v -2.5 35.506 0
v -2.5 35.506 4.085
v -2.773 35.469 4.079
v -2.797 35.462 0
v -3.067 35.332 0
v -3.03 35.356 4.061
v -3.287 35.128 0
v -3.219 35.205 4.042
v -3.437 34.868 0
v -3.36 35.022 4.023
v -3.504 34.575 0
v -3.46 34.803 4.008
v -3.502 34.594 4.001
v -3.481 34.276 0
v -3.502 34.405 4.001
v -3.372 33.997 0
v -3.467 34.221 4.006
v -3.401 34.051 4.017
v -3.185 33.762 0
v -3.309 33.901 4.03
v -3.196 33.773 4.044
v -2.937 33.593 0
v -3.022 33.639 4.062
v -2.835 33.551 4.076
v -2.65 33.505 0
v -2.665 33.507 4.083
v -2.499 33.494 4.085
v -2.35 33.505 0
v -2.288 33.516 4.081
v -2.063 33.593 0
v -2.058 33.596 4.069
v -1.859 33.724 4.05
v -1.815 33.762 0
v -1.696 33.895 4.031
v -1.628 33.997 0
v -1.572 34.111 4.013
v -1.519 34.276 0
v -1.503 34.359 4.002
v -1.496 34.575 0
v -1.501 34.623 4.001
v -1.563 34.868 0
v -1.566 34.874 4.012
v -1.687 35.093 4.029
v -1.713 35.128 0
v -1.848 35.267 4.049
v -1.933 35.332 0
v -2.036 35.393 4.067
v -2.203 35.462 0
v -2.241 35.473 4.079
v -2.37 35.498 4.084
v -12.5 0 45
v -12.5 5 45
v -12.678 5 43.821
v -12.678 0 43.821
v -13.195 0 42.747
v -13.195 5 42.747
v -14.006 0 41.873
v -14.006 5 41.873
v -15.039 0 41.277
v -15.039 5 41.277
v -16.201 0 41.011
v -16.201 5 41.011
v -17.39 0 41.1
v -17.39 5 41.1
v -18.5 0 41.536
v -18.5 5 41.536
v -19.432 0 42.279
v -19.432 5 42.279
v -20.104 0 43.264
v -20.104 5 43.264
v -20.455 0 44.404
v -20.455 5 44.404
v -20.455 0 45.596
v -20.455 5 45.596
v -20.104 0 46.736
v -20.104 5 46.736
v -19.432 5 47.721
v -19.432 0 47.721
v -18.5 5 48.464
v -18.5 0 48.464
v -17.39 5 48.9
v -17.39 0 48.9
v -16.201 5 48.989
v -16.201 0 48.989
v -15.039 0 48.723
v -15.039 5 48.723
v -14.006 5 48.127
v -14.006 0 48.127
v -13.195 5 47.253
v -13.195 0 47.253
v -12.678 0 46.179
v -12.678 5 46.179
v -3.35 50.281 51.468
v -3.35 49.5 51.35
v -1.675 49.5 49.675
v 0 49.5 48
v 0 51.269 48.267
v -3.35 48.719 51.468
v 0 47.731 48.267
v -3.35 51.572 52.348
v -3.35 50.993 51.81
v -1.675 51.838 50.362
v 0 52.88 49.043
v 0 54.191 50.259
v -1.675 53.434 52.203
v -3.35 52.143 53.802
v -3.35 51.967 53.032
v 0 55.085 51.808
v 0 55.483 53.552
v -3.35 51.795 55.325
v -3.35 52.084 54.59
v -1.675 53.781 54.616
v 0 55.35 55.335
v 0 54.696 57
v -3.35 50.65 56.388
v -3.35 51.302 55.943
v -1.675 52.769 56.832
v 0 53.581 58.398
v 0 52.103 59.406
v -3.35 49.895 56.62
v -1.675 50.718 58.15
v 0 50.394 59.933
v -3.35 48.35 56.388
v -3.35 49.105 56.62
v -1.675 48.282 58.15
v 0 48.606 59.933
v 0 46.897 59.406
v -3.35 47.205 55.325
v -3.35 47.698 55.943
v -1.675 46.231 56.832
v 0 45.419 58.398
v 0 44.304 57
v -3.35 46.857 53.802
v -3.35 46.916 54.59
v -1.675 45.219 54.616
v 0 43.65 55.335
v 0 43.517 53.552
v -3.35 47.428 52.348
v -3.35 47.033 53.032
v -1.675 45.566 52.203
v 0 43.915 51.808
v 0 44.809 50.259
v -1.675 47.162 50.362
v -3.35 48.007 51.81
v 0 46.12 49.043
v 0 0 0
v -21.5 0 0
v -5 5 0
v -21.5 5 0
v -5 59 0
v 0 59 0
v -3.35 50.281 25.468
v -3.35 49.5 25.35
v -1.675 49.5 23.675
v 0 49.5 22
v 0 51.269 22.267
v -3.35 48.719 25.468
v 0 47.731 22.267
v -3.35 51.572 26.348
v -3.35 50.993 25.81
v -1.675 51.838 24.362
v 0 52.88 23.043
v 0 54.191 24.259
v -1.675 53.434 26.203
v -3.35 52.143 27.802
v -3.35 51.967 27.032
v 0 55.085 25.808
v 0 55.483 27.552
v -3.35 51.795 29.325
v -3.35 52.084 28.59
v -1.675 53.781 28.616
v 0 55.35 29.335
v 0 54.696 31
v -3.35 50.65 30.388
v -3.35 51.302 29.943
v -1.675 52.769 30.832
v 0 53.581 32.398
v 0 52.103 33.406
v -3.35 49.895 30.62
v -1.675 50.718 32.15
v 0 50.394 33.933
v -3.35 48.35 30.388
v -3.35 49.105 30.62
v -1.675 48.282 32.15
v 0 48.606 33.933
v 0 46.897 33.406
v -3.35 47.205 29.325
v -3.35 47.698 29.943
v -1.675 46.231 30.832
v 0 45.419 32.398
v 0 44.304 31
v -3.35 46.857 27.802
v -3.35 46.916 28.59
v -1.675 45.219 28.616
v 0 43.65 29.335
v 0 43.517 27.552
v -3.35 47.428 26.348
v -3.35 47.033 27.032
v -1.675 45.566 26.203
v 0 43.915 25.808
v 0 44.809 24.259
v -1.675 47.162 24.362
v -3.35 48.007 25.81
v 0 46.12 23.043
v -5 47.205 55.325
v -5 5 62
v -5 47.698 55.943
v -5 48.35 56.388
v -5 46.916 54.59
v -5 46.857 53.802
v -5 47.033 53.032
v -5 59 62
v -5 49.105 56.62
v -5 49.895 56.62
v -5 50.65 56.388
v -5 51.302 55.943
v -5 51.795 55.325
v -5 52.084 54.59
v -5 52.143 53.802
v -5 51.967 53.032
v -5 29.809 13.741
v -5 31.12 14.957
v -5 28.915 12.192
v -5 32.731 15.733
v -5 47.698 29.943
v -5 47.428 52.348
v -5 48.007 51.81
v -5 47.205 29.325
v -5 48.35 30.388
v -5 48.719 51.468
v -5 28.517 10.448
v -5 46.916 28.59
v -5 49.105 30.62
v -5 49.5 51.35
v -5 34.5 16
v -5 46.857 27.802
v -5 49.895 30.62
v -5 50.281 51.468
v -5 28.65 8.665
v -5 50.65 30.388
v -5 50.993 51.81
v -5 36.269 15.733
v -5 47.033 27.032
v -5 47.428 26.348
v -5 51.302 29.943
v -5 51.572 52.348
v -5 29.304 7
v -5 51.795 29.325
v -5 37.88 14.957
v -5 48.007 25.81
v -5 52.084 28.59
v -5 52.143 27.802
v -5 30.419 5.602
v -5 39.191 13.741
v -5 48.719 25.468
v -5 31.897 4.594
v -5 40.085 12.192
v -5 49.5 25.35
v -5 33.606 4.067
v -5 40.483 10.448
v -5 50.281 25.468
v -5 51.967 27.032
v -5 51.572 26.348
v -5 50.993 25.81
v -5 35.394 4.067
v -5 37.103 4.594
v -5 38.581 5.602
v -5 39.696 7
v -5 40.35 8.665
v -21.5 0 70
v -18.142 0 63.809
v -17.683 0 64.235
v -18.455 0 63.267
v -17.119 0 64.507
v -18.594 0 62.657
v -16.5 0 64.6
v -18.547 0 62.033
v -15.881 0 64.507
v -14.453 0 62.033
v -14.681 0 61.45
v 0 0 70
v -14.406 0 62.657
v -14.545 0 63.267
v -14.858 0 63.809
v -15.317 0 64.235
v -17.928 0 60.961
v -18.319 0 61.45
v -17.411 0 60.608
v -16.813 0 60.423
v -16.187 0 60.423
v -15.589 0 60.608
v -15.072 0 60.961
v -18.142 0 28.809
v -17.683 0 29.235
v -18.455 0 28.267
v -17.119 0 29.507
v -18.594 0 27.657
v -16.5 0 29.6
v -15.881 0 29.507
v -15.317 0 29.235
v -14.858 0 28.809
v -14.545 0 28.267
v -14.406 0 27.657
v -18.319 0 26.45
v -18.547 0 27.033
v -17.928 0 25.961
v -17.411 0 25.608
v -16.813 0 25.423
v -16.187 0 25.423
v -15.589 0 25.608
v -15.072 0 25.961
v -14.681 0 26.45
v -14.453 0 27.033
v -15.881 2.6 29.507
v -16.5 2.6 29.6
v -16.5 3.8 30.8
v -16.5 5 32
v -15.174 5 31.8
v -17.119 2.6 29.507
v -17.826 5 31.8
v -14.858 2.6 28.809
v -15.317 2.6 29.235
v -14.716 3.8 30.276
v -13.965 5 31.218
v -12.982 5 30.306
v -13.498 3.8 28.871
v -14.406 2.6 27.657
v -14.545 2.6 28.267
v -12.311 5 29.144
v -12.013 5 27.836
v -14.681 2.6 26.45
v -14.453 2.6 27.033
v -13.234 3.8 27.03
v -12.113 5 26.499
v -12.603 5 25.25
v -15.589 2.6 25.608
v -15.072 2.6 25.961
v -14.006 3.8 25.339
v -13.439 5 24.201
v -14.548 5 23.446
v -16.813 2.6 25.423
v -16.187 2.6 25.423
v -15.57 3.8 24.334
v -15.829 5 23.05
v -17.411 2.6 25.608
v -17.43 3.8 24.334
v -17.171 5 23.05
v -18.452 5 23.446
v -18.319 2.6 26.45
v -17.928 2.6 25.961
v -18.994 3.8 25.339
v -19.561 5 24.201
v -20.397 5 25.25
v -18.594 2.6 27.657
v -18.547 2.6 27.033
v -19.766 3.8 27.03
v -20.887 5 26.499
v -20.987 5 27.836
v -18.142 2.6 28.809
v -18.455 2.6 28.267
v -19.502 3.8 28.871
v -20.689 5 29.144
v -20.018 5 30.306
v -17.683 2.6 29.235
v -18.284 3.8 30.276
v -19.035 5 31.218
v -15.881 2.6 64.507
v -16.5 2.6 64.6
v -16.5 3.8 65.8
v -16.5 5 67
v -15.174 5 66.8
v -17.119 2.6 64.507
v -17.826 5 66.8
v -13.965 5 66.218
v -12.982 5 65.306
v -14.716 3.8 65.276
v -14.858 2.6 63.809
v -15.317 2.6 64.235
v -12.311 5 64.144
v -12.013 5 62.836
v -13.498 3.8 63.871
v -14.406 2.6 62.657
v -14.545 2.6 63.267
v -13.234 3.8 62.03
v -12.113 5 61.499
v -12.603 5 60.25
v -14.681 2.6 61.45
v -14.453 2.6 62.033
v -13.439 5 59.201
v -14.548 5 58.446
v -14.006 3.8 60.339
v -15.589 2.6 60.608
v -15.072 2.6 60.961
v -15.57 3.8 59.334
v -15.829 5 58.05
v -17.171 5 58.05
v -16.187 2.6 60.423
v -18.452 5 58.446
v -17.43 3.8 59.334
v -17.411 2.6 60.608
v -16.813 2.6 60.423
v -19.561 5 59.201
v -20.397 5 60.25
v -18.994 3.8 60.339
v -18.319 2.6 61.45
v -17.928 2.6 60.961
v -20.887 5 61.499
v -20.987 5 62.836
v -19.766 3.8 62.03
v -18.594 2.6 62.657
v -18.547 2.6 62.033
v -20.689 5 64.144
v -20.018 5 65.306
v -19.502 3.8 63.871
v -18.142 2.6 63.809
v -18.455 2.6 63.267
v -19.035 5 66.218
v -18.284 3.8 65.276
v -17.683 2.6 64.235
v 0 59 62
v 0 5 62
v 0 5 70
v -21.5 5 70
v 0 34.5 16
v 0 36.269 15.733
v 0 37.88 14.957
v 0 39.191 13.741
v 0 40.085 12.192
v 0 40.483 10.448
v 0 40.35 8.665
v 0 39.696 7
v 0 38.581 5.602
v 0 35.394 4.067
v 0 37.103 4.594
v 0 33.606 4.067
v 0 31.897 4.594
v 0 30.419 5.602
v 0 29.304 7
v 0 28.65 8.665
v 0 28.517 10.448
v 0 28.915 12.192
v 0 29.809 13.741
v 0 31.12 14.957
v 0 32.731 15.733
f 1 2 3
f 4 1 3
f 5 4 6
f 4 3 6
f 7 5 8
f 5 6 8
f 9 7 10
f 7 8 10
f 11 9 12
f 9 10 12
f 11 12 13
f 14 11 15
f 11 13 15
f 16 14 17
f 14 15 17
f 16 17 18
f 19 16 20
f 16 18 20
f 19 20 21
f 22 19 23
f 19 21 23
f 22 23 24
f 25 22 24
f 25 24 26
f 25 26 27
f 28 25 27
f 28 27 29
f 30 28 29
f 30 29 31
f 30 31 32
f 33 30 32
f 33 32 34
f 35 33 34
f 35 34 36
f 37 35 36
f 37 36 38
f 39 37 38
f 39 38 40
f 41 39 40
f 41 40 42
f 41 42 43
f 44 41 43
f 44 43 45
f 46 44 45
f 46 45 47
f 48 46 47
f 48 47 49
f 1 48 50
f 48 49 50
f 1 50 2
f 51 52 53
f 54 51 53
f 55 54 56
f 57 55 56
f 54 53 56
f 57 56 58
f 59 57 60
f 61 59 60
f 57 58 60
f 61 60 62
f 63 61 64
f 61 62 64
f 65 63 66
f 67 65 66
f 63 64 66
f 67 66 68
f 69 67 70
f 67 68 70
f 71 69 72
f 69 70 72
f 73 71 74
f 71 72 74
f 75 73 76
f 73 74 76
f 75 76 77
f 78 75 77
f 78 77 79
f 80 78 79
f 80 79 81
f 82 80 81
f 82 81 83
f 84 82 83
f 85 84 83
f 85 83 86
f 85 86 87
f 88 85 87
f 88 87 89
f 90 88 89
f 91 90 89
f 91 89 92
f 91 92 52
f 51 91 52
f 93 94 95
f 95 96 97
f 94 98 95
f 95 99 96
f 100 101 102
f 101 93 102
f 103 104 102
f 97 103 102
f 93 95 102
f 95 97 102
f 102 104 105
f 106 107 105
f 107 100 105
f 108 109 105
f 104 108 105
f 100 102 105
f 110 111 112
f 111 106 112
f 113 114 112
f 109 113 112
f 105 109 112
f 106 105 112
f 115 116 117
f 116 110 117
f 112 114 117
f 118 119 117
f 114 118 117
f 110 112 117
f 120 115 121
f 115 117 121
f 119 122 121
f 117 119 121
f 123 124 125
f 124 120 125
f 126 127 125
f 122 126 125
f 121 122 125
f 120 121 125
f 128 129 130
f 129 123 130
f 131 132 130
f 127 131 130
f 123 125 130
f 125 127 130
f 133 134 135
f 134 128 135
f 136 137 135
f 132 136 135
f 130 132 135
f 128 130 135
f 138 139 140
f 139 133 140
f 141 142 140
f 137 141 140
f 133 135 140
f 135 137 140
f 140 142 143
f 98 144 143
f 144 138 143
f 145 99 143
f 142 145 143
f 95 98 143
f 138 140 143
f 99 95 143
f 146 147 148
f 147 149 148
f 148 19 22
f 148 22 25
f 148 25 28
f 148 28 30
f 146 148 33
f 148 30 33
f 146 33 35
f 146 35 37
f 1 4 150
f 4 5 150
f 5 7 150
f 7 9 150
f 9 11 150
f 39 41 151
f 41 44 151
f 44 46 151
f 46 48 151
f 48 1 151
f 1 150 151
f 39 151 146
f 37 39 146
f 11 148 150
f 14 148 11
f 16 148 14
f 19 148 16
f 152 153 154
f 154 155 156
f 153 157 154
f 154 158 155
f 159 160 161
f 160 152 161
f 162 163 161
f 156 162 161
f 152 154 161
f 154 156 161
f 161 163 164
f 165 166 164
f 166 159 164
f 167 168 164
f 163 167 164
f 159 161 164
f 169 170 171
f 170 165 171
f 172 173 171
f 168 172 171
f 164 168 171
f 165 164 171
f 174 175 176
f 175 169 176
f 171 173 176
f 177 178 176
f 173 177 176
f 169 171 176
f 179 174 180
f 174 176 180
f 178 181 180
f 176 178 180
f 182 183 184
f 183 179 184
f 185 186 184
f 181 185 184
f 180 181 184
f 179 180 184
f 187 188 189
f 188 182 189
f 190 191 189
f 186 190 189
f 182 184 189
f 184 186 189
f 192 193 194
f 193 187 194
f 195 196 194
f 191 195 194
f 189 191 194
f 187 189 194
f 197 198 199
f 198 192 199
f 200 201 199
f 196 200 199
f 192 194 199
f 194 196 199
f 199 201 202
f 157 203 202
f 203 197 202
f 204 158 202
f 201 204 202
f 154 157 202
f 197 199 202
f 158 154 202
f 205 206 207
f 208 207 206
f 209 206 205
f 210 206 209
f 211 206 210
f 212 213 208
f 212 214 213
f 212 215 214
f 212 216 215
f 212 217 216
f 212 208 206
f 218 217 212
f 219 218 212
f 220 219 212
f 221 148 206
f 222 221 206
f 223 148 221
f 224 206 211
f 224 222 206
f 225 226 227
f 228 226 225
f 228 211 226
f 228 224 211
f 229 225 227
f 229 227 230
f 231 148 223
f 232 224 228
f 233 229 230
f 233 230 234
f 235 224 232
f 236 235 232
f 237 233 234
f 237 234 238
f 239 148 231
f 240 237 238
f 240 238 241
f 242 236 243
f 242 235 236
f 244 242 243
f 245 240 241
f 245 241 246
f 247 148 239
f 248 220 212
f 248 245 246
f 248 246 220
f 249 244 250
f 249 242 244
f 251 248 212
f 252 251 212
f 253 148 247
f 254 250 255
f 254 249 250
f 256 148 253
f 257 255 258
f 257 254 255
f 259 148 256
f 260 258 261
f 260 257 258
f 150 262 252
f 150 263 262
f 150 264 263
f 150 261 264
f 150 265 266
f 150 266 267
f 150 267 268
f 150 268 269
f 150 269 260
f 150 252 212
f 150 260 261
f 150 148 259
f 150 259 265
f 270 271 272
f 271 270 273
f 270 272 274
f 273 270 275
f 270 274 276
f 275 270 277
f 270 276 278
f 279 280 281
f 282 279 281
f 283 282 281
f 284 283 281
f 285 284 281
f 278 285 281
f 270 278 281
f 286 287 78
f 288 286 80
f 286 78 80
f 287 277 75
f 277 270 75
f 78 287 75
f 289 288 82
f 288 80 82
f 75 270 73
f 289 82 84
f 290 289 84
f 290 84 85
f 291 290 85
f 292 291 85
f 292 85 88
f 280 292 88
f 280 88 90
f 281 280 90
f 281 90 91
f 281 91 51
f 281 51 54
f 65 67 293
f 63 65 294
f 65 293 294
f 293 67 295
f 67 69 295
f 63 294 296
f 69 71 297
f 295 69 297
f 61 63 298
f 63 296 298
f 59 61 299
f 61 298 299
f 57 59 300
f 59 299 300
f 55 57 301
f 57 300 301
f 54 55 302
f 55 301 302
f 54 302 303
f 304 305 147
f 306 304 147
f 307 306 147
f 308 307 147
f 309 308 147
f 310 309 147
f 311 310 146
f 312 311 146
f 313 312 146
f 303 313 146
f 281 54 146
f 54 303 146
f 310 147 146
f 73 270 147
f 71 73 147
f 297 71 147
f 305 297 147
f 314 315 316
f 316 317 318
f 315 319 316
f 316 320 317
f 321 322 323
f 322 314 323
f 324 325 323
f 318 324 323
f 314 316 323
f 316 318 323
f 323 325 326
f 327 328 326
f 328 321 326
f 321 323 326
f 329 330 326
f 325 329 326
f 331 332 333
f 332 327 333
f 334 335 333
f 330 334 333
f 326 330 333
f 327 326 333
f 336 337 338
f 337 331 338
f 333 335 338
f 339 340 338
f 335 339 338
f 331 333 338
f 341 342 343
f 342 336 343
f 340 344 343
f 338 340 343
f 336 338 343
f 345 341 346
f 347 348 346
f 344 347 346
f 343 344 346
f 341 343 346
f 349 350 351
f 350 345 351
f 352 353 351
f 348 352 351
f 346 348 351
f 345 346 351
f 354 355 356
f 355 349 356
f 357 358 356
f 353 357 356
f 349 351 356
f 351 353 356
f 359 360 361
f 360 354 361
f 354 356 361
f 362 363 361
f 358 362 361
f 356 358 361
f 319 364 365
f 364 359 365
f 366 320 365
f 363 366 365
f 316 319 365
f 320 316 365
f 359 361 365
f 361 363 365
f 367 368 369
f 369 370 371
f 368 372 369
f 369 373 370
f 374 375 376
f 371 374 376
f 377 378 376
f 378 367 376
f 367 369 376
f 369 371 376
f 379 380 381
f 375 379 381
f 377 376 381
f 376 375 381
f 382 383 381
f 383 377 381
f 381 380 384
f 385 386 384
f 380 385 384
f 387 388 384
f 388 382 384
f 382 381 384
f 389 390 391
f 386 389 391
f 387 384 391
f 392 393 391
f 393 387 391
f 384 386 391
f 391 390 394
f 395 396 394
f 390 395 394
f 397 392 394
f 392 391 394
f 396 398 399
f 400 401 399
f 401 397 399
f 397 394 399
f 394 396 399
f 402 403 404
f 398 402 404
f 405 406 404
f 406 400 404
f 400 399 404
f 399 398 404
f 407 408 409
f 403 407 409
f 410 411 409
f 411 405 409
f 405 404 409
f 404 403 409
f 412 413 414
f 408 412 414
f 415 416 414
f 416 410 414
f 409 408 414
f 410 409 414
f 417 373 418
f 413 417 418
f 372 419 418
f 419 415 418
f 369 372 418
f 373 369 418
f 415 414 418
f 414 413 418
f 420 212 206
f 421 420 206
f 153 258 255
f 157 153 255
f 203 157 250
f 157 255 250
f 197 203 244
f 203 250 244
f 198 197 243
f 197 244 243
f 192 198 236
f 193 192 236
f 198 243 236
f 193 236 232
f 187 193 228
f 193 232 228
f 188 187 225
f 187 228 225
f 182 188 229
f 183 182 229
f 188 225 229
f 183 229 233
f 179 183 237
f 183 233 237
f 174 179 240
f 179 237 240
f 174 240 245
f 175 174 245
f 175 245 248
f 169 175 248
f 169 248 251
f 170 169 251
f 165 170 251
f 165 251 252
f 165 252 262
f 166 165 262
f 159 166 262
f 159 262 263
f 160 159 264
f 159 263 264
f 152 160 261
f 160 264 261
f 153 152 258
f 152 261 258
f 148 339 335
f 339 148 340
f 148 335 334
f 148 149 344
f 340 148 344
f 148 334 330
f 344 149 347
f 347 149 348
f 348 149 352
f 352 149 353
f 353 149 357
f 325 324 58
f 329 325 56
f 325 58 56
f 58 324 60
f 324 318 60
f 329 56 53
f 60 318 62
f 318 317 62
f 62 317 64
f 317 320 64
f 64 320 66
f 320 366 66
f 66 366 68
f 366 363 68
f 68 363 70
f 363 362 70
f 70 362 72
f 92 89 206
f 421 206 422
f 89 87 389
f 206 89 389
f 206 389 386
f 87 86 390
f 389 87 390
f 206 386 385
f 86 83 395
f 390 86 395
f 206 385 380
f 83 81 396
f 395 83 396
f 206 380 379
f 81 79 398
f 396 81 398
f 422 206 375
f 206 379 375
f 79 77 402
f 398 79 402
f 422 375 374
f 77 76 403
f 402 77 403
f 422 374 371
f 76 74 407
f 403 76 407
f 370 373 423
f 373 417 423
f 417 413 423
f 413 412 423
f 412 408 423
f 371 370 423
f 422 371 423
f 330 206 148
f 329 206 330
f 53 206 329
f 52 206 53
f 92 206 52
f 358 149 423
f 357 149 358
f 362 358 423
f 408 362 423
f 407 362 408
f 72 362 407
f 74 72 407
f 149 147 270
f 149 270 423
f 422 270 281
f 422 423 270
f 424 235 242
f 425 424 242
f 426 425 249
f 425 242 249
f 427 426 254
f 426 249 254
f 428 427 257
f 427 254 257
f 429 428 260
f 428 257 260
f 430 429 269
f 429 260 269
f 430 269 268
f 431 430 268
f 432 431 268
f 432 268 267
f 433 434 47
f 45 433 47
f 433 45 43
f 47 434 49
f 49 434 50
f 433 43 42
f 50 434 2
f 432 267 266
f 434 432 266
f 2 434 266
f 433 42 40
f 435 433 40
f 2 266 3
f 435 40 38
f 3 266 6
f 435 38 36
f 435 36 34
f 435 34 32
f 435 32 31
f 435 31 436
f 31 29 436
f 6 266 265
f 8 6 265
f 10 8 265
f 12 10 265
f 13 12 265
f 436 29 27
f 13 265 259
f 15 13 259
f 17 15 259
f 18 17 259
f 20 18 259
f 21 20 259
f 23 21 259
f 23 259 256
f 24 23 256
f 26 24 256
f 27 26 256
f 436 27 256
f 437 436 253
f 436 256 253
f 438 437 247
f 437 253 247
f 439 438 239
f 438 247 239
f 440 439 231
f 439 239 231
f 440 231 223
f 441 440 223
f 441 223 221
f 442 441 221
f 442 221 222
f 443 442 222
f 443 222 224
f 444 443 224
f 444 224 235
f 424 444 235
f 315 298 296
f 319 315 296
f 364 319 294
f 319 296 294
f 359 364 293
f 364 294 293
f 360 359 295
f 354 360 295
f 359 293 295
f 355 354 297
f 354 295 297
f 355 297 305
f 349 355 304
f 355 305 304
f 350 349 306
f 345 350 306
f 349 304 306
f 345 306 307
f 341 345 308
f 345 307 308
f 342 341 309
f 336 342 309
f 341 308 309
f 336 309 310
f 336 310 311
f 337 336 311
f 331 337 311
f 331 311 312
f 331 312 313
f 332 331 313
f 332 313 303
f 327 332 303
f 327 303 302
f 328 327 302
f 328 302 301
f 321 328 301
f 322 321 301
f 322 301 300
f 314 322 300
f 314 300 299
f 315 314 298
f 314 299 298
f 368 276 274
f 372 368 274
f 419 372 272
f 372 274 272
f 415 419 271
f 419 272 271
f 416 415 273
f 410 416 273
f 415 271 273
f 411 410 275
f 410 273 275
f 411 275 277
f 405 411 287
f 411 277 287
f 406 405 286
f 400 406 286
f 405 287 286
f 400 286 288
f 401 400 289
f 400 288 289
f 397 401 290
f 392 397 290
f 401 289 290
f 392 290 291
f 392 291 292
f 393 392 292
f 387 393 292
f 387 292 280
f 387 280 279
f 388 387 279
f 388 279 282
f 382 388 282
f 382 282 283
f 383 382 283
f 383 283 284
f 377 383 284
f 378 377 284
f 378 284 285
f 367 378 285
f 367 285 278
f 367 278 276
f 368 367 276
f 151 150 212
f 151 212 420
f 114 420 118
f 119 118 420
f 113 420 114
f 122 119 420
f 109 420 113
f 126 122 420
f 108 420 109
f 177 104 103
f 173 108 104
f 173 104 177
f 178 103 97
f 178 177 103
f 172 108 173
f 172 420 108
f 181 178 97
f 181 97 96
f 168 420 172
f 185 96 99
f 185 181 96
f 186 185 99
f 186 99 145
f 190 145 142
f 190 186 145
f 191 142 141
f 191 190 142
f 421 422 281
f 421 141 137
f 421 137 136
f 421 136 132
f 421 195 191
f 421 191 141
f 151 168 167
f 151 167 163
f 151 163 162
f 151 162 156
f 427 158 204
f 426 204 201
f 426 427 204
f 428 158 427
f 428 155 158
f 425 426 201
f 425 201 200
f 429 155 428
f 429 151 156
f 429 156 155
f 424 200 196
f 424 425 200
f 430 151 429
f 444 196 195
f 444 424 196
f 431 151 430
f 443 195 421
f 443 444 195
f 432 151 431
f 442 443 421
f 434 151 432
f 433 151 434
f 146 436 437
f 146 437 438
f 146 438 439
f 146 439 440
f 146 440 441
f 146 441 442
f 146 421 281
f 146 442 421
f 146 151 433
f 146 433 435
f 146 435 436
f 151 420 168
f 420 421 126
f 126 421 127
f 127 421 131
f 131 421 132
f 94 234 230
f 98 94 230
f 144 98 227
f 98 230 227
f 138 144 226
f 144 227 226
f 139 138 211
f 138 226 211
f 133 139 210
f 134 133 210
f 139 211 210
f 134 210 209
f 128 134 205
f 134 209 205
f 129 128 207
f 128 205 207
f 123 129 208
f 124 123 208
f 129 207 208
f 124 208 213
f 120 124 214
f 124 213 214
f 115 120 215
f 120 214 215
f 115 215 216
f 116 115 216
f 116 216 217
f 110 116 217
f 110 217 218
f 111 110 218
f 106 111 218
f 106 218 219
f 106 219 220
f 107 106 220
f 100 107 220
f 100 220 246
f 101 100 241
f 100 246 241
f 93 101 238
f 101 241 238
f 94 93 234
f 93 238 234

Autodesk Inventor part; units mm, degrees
ref_plane "YZ Plane" through (0, 0, 0) normal (1, 0, 0) x (0, 1, 0)
ref_plane "XZ Plane" through (0, 0, 0) normal (0, 1, 0) x (-1, 0, 0)
ref_plane "XY Plane" through (0, 0, 0) normal (0, 0, 1) x (1, 0, 0)
sketch "Skizze1" plane through (0, 0, 0) normal (0, 0, 1) x (1, 0, 0)
  line L0 (0, 70.8) -> (0, -11.8) projected
  line L1 (-25.8, 0) -> (4.3, 0) projected
  line L2 (-21.5, 0) -> (-21.5, 5)
  line L3 (-21.5, 5) -> (-5, 5)
  line L4 (-5, 5) -> (-5, 59)
  line L5 (-5, 59) -> (0, 59)
  line L6 (0, 59) -> (0, 0)
  line L7 (0, 0) -> (-21.5, 0)
  dimension "d0" = 16.5
  dimension "d1" = 5
  dimension "d2" = 5
  dimension "d3" = 54
extrude "Extrusion1" add sketch "Skizze1" along normal blind 70
sketch "Skizze2" plane through (-21.5, 5, 0) normal (0, 1, 0) x (1, 0, 0)
  line L0 (0, -70) -> (16.5, -70) projected
  line L1 (0, 0) -> (0, -70) projected
  point P0 (21.5, 0)
  point P1 (5, -62.5)
  point P2 (5, -27.5)
  dimension "d6" = 35
  dimension "d7" = 5
  dimension "d8" = 5
  dimension "d9" = 7.5
hole "Bohrung1" at (-16.5, 5, 62.5) at (-16.5, 5, 27.5) direction (0, -1, 0) diameter 4.2 end through all countersink diameter 9 countersink angle 90 clearance for "Innensechskant-Senkkopfschraube DIN EN ISO 10642" size "M4" standard "DIN"
sketch "Skizze3" plane through (-21.5, 5, 0) normal (0, 1, 0) x (1, 0, 0)
  circle A0 centre (5, -27.5) radius 4.5 projected
  circle A1 centre (5, -62.5) radius 4.5 projected
  line L0 (0, 0) -> (0, -70) projected
  line L1 (5, -62.5) -> (5, -27.5) construction
  circle A2 centre (5, -45) radius 4
  point P0 (21.5, 0)
  dimension "d18" = 17.5
  dimension "d19" = 8
extrude "Extrusion2" cut sketch "Skizze3" against normal up to surface (5 mm away) contours A2
sketch "Skizze4" plane through (0, 0, 0) normal (1, 0, 0) x (0, 0, -1)
  line L0 (-70, 59) -> (-70, 0) projected
  line L1 (0, 59) -> (-70, 59) projected
  circle A0 centre (-34, 39.5) radius 2.067 projected
  circle A1 centre (-8, 39.5) radius 2.067 projected
  point P0 (-54, 49.5)
  point P1 (-28, 49.5)
  dimension "d34" = 9.5
  dimension "d35" = 9.5
  dimension "d36" = 16
  dimension "d37" = 26
hole "Bohrung2" at (0, 49.5, 54) at (0, 49.5, 28) direction (-1, 0, 0) diameter 5.3 end through all countersink diameter 12 countersink angle 90 clearance for "Innensechskant-Senkkopfschraube DIN EN ISO 10642" size "M5" standard "DIN"
sketch "Skizze5" plane through (-5, 5, 0) normal (-1, 0, 0) x (0, 0, 1)
  line L0 (0, 54) -> (70, 54) projected
  line L1 (0, 54) -> (0, 0) projected
  circle A0 centre (10, 29.5) radius 6
  circle A1 centre (28, 44.5) radius 2.067 projected
  circle A2 centre (54, 44.5) radius 2.067 projected
  circle A3 centre (18.5, 60.5) radius 2.2 projected
  line L2 (62, 72) -> (62, 35) projected
  line L3 (62, 72) -> (-5.5, 72) projected
  arc A4 (-28, 90.2303) -> (-5.5, 72) centre (-5.5, 95) ccw projected
  line L4 (-28, 15) -> (-28, 90.2303) projected
  line L5 (-28, 15) -> (-18, 15) projected
  line L6 (-18, 35) -> (-18, 15) projected
  line L7 (62, 35) -> (-18, 35) projected
  circle A5 centre (28, 44.5) radius 2.65 projected
  circle A6 centre (54, 44.5) radius 2.65 projected
  line L8 (70, 0) -> (70, 54) projected
  line L9 (0, 54) -> (70, 54) projected
  line L10 (0, 54) -> (0, 0) projected
  line L11 (0, 0) -> (70, 0) projected
  line L12 (32.75, 18) -> (32.75, 106)
  point P0 (0, -5)
  dimension "d38" = 24.5
  dimension "d39" = 12
  dimension "d40" = 10
extrude "Extrusion3" cut sketch "Skizze5" against normal blind 5 contours L7 A0 | A0 L7
sketch "Skizze7" plane through (0, 0, 0) normal (0, 0, -1) x (-1, 0, 0)
  line L0 (0, 28.5) -> (0, 40.5) projected
  line L1 (0, 28.5) -> (0, 40.5) projected
  line L2 (5, 40.5) -> (5, 28.5) projected
  line L3 (5, 28.5) -> (0, 28.5) projected
  line L4 (5, 40.5) -> (0, 40.5) projected
  point P0 (2.5, 34.5)
hole "Bohrung3" at (-2.5, 34.5, 0) direction (0, 0, 1) diameter 2.013 end up to surface thread size "M2.5x0.45" class "6H" standard "ISO Metric profile"
sketch "Skizze8" plane through (-5, 5, 0) normal (-1, 0, 0) x (0, 0, 1)
  line L0 (0, 0) -> (70, 0) projected
  line L1 (70, 54) -> (62, 54)
  line L2 (62, 54) -> (62, 0)
  line L3 (62, 0) -> (70, 0)
  line L4 (70, 0) -> (70, 54)
  point P0 (0, -5)
  dimension "d50" = 8
extrude "Extrusion4" cut sketch "Skizze8" against normal blind 5
equation "\"d2\" = d1"
equation "\"d8\" = d7"
equation "\"d35\" = d34"
properties part number "Motorhalter" material "Aluminum-6061"
